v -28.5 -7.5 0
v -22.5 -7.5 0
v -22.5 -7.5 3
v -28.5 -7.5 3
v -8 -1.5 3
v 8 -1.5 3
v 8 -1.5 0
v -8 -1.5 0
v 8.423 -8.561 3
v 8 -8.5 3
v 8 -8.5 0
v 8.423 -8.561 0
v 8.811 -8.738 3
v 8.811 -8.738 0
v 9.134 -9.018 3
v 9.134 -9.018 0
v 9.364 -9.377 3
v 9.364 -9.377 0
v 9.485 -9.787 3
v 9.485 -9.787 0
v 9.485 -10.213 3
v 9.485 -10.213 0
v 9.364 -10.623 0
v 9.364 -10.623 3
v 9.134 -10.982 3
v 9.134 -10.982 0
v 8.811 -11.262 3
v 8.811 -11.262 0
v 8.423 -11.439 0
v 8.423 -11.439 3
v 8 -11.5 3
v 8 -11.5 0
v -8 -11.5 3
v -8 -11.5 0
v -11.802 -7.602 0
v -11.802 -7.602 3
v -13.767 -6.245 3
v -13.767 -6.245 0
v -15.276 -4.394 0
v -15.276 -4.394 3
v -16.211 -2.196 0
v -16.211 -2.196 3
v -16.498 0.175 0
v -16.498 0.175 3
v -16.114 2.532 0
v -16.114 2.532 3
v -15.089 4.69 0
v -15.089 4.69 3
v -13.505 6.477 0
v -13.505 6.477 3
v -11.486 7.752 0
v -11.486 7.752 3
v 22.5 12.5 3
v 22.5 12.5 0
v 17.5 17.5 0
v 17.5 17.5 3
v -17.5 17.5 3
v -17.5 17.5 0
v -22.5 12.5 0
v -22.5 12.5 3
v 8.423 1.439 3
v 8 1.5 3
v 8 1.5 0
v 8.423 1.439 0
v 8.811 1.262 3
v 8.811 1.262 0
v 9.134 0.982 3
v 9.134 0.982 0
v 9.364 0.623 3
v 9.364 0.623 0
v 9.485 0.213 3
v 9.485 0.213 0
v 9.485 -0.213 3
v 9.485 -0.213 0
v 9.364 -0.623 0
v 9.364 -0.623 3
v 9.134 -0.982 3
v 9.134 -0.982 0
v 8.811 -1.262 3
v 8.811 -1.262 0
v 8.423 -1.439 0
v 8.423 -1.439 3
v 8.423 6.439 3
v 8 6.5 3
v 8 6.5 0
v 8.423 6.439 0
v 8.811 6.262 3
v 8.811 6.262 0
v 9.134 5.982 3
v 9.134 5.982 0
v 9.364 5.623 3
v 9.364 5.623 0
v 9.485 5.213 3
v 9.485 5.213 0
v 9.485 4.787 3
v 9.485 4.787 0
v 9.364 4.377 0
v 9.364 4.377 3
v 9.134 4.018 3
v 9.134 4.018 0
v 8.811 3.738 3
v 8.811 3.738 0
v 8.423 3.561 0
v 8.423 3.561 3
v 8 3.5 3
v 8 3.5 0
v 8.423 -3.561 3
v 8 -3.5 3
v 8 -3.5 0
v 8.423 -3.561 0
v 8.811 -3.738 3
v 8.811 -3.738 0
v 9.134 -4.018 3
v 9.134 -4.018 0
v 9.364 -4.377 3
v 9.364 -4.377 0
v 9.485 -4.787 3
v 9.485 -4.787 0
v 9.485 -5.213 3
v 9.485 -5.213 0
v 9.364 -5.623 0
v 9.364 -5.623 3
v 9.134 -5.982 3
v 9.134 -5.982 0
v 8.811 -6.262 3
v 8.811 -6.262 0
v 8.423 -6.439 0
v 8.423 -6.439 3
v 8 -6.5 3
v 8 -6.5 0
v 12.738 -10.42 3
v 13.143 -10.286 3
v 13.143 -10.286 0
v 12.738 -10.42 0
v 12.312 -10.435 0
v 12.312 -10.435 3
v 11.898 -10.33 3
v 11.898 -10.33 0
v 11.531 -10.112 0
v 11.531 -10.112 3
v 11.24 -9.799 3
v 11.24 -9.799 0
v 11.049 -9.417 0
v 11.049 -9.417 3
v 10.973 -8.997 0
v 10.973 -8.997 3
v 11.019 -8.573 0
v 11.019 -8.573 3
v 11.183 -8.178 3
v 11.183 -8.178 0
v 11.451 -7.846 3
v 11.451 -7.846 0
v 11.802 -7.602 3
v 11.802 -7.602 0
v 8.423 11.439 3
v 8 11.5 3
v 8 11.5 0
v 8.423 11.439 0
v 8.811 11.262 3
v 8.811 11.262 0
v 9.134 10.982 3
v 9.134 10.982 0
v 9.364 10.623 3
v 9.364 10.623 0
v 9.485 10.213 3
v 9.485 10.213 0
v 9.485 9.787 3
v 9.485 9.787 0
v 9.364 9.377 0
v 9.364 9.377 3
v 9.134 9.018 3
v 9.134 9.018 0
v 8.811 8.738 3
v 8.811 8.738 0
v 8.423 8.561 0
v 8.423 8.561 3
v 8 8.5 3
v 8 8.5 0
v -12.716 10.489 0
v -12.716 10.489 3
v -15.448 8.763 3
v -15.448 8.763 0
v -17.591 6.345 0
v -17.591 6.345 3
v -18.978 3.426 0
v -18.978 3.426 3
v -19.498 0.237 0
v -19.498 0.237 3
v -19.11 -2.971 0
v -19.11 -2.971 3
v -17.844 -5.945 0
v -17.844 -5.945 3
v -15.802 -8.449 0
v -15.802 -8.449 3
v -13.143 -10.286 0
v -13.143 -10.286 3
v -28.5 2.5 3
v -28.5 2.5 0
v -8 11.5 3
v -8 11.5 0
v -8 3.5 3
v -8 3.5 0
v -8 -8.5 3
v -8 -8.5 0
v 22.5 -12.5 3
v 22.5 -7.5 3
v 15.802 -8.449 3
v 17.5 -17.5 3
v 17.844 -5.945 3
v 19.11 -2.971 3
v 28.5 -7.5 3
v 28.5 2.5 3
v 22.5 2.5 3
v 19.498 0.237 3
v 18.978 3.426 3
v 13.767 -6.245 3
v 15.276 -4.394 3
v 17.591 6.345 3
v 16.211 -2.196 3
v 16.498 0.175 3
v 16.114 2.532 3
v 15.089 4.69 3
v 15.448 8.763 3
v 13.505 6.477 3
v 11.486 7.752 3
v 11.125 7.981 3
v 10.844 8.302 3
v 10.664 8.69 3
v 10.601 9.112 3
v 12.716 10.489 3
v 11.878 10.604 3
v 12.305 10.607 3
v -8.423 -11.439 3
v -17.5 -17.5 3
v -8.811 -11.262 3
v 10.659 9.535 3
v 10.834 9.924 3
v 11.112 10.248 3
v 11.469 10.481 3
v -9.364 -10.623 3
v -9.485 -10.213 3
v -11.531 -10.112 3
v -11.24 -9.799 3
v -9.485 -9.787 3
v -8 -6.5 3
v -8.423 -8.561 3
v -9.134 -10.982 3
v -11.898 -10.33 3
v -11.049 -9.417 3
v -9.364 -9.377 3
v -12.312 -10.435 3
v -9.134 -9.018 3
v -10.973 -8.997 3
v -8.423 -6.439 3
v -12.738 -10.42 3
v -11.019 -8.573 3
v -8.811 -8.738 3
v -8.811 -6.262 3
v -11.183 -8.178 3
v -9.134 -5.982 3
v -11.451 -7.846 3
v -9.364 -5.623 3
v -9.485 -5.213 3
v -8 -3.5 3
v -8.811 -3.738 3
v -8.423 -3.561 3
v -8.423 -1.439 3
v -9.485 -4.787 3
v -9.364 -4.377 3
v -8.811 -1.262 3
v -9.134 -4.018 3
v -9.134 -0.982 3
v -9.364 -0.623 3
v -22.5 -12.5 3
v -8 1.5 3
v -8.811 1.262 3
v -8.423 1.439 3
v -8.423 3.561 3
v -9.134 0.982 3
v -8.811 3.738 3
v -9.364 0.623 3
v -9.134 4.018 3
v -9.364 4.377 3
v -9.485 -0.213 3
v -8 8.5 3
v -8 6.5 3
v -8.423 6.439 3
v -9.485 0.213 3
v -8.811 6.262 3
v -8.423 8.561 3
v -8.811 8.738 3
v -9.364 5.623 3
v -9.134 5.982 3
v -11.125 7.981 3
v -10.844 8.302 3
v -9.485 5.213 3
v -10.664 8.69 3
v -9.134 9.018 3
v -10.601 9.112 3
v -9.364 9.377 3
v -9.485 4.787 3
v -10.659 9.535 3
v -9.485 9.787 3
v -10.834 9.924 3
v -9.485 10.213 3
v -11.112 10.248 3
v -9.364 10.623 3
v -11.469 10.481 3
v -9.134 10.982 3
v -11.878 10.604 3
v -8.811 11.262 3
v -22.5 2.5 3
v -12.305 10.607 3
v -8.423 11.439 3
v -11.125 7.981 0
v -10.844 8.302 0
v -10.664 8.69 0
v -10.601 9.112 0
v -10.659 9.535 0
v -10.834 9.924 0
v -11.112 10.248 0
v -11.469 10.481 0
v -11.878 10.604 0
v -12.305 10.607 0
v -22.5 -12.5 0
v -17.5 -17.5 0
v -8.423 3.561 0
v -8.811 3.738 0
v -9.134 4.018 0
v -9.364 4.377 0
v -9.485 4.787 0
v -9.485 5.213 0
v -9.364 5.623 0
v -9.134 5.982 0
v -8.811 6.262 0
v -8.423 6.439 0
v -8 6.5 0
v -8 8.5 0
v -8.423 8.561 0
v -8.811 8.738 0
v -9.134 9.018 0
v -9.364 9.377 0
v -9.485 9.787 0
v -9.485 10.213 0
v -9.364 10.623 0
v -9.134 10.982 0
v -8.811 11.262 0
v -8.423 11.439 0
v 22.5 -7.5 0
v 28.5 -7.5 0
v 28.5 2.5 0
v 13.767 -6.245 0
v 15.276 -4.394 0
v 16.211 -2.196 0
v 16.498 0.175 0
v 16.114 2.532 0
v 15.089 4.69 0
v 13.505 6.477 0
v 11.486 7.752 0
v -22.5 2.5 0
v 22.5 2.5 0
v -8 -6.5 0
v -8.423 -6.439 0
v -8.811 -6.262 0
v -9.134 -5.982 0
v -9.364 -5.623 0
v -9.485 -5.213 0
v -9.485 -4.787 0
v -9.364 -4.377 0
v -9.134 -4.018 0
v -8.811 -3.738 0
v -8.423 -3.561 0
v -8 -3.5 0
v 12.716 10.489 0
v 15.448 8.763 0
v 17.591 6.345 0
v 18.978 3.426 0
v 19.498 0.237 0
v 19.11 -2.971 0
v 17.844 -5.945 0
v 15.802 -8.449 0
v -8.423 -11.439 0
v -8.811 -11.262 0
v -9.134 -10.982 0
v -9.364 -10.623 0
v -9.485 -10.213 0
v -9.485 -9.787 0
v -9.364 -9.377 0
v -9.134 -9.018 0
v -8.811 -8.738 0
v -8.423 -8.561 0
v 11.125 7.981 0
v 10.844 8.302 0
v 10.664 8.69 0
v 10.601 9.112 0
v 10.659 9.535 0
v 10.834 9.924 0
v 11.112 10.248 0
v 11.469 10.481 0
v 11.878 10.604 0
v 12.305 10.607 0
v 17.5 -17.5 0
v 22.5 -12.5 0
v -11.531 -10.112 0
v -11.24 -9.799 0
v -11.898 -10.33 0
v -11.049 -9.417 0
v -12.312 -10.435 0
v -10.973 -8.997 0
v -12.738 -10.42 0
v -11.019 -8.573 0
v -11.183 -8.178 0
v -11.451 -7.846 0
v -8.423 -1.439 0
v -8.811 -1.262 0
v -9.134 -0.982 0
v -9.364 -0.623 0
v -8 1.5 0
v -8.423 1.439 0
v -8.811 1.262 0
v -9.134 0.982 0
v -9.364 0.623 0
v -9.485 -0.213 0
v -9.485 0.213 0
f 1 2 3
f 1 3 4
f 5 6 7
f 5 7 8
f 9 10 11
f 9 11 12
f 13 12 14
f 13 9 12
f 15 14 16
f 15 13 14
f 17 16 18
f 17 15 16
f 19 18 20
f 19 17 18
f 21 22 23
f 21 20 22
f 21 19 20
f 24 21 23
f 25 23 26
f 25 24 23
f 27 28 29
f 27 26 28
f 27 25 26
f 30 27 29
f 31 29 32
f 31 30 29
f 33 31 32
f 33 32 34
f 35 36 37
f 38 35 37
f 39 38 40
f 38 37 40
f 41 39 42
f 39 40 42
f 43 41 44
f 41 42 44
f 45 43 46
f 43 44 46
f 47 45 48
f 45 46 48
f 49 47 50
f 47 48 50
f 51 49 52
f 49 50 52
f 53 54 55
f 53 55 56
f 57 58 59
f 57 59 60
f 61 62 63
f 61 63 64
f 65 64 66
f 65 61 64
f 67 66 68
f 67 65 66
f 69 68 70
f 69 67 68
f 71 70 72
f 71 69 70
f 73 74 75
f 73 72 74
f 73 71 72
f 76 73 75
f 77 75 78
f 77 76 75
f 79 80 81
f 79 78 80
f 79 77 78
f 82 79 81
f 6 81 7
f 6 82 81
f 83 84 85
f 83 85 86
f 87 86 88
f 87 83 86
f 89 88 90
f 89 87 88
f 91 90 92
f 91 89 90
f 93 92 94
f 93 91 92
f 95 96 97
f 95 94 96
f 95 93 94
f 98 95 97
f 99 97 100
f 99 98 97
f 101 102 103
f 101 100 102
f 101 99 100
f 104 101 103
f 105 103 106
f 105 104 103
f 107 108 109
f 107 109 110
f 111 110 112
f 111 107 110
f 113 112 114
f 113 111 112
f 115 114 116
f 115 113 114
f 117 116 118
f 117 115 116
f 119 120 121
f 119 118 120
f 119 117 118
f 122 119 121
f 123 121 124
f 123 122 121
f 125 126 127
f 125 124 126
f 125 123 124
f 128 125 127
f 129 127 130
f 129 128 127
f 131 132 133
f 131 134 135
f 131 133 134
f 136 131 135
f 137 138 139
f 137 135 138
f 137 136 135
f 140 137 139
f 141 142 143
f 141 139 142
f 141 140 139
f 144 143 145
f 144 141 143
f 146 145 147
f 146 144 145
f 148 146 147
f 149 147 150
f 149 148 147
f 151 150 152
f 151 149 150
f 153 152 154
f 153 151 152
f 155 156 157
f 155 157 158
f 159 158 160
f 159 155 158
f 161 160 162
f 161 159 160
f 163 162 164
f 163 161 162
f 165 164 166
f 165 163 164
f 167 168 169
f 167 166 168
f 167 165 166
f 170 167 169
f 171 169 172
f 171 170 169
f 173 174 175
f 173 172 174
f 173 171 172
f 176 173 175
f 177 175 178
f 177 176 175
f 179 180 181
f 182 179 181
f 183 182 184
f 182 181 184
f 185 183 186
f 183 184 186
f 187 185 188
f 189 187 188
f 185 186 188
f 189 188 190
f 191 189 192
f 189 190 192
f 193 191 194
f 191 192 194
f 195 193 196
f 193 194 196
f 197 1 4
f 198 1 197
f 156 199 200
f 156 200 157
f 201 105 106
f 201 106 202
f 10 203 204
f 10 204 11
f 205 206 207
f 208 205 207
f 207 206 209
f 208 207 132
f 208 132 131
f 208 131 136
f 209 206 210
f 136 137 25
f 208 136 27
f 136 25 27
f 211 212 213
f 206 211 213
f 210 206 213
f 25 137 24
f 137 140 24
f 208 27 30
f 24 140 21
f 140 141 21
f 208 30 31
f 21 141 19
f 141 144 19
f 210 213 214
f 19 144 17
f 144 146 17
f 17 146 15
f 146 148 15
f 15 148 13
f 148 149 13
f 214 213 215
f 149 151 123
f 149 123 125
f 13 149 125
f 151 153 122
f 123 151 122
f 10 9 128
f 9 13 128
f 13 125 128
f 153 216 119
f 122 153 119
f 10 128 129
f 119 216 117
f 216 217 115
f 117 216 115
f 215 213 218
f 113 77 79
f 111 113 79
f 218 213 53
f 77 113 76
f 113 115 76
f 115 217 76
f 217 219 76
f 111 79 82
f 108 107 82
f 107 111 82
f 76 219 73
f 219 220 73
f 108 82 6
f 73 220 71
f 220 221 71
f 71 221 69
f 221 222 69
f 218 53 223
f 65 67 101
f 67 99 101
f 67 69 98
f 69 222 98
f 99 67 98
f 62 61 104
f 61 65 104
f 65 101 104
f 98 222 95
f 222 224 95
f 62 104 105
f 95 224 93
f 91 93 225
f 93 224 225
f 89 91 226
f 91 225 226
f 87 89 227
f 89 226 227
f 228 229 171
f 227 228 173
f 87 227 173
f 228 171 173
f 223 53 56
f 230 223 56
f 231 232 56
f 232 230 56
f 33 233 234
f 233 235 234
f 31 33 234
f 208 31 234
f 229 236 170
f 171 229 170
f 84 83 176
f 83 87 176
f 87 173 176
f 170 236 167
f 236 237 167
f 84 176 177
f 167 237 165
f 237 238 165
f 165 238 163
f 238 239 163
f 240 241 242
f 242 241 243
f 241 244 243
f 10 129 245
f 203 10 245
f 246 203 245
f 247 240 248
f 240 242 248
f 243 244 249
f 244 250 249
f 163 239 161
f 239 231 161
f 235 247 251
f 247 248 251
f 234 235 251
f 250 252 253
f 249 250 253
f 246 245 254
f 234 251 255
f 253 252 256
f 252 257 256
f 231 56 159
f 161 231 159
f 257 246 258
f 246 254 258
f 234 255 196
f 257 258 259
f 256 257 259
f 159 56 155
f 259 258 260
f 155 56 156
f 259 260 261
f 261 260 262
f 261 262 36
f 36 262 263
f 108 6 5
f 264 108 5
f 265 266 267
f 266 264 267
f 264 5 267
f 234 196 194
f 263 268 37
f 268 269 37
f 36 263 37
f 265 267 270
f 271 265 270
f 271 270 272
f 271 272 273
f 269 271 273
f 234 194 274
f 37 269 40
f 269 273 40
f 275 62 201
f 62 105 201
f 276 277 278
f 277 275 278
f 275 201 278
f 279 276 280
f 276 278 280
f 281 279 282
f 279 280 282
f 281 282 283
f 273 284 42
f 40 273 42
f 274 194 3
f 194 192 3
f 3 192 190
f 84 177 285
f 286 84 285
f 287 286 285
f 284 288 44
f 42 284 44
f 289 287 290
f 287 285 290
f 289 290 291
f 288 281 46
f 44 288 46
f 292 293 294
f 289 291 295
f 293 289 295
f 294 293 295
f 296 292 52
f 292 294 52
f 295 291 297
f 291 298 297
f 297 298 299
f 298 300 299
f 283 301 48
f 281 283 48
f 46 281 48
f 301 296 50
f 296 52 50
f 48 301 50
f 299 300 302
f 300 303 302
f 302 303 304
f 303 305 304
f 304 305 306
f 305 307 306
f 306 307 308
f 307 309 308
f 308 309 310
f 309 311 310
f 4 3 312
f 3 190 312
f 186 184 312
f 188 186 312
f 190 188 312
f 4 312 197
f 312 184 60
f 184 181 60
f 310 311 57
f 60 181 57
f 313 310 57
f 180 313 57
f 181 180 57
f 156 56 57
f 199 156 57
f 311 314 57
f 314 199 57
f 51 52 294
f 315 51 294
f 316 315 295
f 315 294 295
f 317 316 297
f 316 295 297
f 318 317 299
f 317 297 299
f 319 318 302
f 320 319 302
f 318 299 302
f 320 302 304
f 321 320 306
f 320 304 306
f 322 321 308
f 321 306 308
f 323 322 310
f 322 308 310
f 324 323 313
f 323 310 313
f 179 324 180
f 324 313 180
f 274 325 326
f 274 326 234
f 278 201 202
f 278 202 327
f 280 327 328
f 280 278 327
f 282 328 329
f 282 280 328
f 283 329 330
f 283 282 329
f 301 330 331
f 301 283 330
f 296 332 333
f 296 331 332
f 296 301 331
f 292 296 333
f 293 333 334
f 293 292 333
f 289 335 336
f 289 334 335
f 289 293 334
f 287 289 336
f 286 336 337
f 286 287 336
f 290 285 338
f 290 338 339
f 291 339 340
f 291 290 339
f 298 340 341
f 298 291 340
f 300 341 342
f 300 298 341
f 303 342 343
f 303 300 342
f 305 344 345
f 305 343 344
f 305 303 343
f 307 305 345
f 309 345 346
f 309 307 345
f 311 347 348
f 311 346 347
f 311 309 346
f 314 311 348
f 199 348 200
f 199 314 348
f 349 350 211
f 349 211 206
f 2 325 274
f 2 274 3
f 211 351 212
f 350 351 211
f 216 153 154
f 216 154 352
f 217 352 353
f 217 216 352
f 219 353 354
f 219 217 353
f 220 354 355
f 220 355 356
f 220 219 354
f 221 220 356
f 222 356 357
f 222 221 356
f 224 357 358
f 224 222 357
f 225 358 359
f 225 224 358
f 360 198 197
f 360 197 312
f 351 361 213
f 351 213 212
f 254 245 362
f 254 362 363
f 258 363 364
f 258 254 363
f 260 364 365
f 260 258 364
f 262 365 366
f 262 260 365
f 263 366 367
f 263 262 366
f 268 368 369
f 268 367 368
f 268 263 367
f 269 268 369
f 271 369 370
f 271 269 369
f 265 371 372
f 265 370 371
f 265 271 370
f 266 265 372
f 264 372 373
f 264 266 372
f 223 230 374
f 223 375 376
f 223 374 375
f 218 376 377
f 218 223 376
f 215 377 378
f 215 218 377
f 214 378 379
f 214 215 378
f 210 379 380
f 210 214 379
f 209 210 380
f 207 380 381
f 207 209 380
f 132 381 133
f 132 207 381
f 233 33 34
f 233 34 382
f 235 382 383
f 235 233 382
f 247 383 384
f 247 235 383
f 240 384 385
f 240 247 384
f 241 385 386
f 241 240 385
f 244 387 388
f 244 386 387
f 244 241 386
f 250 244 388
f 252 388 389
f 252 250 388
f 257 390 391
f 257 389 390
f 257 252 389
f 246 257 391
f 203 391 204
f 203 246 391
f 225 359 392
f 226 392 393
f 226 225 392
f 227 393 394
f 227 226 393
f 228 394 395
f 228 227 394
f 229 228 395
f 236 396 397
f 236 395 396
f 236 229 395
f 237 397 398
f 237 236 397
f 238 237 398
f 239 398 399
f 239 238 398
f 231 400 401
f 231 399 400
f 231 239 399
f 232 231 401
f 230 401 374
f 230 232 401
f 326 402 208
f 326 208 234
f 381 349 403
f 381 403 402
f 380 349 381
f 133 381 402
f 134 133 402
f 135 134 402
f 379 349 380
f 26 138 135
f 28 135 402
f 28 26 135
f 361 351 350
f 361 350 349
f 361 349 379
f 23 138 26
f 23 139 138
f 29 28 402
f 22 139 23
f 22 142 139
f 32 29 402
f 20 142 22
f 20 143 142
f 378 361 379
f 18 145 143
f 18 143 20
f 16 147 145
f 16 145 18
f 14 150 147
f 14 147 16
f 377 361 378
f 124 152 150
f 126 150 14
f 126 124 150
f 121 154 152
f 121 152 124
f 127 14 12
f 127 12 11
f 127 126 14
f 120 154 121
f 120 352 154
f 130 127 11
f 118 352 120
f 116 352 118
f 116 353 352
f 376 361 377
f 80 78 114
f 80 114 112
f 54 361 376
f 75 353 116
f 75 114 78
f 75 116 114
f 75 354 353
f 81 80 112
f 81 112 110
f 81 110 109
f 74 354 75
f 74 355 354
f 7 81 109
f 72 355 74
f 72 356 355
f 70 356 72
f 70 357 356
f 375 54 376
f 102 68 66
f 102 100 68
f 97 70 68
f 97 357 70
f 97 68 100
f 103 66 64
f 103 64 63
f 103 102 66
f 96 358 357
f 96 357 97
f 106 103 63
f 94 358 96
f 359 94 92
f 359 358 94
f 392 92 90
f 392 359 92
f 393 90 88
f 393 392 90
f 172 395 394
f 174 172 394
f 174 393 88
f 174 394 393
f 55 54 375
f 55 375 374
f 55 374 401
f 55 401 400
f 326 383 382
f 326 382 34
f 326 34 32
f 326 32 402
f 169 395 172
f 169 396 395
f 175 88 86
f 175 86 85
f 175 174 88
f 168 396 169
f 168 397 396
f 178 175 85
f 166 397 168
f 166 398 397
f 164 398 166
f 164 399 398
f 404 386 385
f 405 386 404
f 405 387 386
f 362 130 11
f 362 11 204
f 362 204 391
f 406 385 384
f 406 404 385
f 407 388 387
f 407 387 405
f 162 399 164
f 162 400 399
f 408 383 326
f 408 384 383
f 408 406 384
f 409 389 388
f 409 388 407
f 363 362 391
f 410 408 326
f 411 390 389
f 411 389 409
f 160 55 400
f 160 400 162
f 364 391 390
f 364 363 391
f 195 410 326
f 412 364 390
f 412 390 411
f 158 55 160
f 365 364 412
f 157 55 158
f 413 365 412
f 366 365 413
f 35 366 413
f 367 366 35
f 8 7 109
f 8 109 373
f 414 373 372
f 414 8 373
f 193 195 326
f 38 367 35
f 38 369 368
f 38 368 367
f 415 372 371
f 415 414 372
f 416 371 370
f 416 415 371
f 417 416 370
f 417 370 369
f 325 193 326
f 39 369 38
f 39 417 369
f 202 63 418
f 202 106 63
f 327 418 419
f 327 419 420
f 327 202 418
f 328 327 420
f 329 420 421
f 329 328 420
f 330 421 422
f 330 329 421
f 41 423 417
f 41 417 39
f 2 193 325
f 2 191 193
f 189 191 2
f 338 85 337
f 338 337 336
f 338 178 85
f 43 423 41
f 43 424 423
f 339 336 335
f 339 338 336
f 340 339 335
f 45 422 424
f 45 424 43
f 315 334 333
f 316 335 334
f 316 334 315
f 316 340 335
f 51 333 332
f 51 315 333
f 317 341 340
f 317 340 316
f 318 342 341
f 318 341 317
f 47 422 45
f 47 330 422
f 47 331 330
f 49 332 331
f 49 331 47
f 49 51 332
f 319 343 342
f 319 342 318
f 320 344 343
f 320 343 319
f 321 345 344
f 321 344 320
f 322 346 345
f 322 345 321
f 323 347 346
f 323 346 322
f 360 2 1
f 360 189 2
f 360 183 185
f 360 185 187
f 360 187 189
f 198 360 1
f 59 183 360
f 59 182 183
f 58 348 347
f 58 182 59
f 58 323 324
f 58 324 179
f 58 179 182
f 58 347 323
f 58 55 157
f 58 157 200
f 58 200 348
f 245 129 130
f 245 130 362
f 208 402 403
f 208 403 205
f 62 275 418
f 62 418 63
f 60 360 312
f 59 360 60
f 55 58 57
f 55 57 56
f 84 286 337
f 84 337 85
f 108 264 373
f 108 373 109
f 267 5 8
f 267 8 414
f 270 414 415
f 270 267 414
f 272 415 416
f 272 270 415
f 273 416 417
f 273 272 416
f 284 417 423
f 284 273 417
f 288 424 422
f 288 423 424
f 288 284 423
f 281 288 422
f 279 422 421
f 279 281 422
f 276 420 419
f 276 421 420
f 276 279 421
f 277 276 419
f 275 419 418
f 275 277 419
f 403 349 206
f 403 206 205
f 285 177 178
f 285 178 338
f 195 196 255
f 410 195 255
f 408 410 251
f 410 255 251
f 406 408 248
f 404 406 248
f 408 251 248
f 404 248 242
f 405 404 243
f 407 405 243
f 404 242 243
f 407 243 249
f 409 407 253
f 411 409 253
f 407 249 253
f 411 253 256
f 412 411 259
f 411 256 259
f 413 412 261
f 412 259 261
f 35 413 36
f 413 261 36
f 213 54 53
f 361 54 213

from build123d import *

# Parameters (mm, degrees)
BOSS_EXTRUDE1_DEPTH = 3
CHAMFER1_SIZE       = 5
CUT_EXTRUDE1_DEPTH  = 5


with BuildPart() as part:
    # Sketch1 → Boss-Extrude1 (new body)
    with BuildSketch(Plane.XY):
        Polygon((22.5, -7.5), (22.5, -17.5), (-22.5, -17.5), (-22.5, -7.5), (-28.5, -7.5), (-28.5, 2.5), (-22.5, 2.5), (-22.5, 17.5), (22.5, 17.5), (22.5, 2.5), (28.5, 2.5), (28.5, -7.5), align=None)
    extrude(amount=BOSS_EXTRUDE1_DEPTH)

    # Chamfer1
    chamfer1_edges = [part.edges().sort_by_distance(p)[0] for p in [
        (-22.5, -17.5, 1.5),
        (-22.5, 17.5, 1.5),
        (22.5, 17.5, 1.5),
        (22.5, -17.5, 1.5),
    ]]
    chamfer(chamfer1_edges, length=CHAMFER1_SIZE)

    # Sketch2 → Cut-Extrude1 (cut)
    with BuildSketch(Plane.XY.offset(3)):
        with BuildLine():
            Line((-8, 1.5), (8, 1.5))
            ThreePointArc((8, 1.5), (9.5, 0), (8, -1.5))
            Line((8, -1.5), (-8, -1.5))
            ThreePointArc((-8, -1.5), (-9.5, 0), (-8, 1.5))
        make_face()
        with BuildLine():
            Line((-8, 6.5), (8, 6.5))
            ThreePointArc((8, 6.5), (9.5, 5), (8, 3.5))
            Line((8, 3.5), (-8, 3.5))
            ThreePointArc((-8, 3.5), (-9.5, 5), (-8, 6.5))
        make_face()
        with BuildLine():
            Line((-8, 11.5), (8, 11.5))
            ThreePointArc((8, 11.5), (9.5, 10), (8, 8.5))
            Line((8, 8.5), (-8, 8.5))
            ThreePointArc((-8, 8.5), (-9.5, 10), (-8, 11.5))
        make_face()
        with BuildLine():
            Line((-8, -3.5), (8, -3.5))
            ThreePointArc((8, -3.5), (9.5, -5), (8, -6.5))
            Line((8, -6.5), (-8, -6.5))
            ThreePointArc((-8, -6.5), (-9.5, -5), (-8, -3.5))
        make_face()
        with BuildLine():
            Line((-8, -8.5), (8, -8.5))
            ThreePointArc((8, -8.5), (9.5, -10), (8, -11.5))
            Line((8, -11.5), (-8, -11.5))
            ThreePointArc((-8, -11.5), (-9.5, -10), (-8, -8.5))
        make_face()
        with BuildLine():
            ThreePointArc((-12.715686471, 10.488674897), (-19.497563389, 0.236719508), (-13.143402946, -10.285689385))
            ThreePointArc((-13.143402946, -10.285689385), (-11.130912642, -9.614956372), (-11.801645656, -7.602466067))
            ThreePointArc((-11.801645656, -7.602466067), (-16.498199026, 0.174966593), (-11.485507392, 7.752498837))
            ThreePointArc((-11.485507392, 7.752498837), (-10.732508901, 9.735676407), (-12.715686471, 10.488674897))
        make_face()
        with BuildLine():
            ThreePointArc((12.715686471, 10.488674897), (19.497563389, 0.236719508), (13.143402946, -10.285689385))
            ThreePointArc((13.143402946, -10.285689385), (11.130912642, -9.614956372), (11.801645656, -7.602466067))
            ThreePointArc((11.801645656, -7.602466067), (16.498199026, 0.174966593), (11.485507392, 7.752498837))
            ThreePointArc((11.485507392, 7.752498837), (10.732508901, 9.735676407), (12.715686471, 10.488674897))
        make_face()
    extrude(amount=-CUT_EXTRUDE1_DEPTH, mode=Mode.SUBTRACT)


solid = part.part
